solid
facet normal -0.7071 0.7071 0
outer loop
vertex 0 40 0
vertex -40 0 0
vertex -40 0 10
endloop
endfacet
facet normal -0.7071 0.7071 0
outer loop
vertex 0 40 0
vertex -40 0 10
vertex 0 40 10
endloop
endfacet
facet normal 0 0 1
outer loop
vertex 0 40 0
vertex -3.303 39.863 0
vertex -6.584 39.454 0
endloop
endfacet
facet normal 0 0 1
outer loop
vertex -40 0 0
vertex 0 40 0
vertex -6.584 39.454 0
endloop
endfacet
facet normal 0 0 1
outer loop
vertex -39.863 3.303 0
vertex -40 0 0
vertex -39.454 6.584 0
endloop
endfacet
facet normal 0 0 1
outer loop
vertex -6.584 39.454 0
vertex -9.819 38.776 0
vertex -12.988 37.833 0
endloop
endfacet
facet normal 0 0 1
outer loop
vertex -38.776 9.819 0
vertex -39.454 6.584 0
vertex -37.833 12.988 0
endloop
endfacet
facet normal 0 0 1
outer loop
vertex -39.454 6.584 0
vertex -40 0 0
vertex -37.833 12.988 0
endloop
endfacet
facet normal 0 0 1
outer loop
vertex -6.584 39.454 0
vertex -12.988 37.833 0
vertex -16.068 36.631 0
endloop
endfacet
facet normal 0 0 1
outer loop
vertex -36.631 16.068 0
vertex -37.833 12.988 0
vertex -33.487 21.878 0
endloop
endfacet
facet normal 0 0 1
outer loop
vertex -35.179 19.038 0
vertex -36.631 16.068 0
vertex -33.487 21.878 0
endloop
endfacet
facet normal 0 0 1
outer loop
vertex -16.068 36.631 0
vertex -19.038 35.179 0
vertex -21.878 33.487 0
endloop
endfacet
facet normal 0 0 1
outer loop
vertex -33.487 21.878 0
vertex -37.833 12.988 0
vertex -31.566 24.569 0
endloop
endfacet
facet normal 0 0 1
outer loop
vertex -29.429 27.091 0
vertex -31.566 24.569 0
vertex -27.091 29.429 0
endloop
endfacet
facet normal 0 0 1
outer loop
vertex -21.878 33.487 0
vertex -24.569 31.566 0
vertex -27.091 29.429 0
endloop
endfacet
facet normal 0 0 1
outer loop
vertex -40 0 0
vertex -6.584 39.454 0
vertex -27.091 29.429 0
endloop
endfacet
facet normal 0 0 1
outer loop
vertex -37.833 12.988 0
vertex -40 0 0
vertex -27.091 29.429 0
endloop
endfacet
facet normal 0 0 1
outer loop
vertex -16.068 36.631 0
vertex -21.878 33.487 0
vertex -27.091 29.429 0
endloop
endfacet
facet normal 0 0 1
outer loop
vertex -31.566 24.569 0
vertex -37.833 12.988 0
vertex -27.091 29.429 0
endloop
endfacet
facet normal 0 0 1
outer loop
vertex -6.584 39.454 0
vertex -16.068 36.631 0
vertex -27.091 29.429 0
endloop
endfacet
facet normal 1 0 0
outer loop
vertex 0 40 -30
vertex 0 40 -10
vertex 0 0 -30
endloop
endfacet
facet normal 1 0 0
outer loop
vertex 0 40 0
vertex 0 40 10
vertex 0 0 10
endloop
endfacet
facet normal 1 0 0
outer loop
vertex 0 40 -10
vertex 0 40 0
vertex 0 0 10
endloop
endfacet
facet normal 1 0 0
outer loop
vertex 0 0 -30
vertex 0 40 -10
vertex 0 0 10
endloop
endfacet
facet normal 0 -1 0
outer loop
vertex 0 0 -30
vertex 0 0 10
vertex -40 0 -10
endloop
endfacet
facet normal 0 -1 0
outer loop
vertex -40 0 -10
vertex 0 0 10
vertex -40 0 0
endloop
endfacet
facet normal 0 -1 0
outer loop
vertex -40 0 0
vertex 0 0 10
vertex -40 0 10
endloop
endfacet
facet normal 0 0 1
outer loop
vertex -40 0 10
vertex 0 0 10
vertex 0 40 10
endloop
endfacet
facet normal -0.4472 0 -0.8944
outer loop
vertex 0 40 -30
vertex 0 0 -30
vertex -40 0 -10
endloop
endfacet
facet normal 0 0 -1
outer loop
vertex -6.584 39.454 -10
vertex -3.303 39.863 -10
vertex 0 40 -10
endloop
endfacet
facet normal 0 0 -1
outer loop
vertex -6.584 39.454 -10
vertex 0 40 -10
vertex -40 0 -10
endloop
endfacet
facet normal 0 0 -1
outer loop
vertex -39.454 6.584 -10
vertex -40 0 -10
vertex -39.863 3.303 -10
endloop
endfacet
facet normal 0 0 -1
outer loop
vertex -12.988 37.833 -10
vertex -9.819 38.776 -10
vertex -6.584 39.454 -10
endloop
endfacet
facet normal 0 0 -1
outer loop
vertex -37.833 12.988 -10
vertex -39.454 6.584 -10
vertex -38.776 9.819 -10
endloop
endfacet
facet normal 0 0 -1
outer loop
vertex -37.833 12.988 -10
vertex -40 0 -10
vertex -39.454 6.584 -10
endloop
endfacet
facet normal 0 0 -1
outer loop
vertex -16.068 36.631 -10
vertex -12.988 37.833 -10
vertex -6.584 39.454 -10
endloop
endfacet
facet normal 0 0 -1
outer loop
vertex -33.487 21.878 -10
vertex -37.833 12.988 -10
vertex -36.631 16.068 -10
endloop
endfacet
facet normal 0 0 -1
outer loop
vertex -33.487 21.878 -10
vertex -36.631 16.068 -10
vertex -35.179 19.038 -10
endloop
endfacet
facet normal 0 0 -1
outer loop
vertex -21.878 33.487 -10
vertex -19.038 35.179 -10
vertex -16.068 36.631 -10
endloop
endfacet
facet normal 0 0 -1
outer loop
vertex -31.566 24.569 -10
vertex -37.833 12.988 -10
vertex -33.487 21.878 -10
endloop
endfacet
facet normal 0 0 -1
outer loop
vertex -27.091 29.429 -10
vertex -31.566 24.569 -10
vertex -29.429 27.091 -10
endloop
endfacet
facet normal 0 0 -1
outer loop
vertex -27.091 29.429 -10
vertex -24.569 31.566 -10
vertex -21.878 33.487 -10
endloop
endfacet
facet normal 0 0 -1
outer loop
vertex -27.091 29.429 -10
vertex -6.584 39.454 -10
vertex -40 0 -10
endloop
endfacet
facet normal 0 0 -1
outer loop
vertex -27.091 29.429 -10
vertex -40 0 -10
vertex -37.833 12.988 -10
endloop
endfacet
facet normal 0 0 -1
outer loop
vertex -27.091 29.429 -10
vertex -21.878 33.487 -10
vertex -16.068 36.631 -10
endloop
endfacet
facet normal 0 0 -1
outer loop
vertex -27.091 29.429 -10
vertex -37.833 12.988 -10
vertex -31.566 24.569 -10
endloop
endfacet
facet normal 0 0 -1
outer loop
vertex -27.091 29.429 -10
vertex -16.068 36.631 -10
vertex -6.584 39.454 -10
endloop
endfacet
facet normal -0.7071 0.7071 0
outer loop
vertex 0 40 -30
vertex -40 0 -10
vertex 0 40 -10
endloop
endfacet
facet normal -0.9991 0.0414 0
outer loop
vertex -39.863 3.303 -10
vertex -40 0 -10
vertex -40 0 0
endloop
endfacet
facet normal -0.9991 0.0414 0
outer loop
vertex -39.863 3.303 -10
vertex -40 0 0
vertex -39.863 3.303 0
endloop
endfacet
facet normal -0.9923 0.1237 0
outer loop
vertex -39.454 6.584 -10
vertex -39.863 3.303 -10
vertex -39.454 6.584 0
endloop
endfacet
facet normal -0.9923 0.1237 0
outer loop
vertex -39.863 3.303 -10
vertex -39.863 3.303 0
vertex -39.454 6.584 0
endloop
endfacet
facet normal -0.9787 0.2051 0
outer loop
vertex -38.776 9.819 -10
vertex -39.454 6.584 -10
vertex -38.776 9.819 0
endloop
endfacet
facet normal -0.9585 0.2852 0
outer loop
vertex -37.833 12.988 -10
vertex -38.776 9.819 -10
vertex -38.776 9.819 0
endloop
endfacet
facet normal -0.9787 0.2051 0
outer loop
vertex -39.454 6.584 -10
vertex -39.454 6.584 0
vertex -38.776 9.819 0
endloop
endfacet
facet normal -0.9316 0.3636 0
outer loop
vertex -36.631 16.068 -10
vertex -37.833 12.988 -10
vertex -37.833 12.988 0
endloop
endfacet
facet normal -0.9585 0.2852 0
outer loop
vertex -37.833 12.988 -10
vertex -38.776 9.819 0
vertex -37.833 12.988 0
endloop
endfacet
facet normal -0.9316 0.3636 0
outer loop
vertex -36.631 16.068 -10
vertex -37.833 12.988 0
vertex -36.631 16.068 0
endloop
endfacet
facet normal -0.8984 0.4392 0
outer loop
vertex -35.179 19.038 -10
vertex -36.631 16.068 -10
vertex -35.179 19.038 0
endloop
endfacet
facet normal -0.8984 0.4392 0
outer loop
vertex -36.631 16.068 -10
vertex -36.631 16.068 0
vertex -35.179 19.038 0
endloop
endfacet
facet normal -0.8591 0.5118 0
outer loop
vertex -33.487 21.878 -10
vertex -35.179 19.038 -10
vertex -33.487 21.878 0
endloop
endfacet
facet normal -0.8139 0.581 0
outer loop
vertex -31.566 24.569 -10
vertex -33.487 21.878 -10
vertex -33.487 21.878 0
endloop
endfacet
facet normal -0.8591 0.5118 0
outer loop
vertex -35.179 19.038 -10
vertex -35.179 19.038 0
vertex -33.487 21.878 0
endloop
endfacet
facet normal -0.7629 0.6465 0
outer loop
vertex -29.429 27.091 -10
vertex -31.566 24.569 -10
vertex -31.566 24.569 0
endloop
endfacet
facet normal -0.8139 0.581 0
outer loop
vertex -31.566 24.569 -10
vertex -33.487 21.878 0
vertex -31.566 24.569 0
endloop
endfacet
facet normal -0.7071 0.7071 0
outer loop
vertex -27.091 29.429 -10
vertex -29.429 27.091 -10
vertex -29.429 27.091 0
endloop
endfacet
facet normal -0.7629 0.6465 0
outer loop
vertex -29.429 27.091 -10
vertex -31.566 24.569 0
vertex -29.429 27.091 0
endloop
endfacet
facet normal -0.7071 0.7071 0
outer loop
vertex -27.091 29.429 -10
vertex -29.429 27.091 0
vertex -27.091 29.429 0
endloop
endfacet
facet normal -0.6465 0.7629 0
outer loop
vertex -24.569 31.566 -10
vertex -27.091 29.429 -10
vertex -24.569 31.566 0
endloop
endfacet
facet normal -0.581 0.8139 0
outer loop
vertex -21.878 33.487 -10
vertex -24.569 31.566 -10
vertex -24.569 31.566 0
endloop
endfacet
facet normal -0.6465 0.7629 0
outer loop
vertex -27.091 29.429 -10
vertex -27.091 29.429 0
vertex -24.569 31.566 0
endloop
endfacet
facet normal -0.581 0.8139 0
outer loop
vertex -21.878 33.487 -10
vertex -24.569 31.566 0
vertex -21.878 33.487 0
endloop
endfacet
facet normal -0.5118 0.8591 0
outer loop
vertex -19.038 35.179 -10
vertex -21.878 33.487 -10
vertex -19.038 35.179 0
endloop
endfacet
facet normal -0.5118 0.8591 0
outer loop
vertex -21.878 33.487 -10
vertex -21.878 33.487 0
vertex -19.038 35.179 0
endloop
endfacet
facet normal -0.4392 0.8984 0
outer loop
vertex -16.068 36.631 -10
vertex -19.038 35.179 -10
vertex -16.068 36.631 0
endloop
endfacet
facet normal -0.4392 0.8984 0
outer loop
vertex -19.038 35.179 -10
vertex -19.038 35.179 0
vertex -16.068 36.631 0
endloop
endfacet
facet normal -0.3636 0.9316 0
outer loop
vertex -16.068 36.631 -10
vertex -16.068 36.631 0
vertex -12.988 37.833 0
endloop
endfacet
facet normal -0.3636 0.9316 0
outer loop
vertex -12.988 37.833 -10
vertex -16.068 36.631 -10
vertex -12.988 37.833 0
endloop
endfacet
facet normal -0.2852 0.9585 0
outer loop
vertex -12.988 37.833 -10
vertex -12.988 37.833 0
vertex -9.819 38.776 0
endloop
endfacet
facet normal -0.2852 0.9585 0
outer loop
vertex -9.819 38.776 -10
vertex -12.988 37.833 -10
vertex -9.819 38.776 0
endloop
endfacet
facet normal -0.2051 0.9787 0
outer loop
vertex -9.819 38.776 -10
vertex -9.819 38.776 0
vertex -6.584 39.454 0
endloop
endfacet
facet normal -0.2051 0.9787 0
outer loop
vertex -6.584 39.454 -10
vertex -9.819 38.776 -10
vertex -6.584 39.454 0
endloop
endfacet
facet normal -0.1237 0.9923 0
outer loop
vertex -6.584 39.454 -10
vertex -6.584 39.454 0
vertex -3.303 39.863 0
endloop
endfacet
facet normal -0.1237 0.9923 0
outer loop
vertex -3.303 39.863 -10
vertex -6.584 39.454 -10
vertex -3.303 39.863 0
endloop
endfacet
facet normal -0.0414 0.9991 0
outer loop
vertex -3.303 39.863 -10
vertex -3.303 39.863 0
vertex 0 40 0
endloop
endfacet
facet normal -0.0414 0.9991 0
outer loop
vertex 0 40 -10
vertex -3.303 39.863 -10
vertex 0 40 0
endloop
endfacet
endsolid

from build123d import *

# Parameters (mm, degrees)
BOSS_EXTRUDE1_DEPTH = 10
BOSS_EXTRUDE2_DEPTH = 10
BOSS_EXTRUDE4_DEPTH = 20
CUT_EXTRUDE3_DEPTH  = 57


with BuildPart() as part:
    # Sketch1 → Boss-Extrude1 (new body)
    with BuildSketch(Plane.XY):
        Polygon((0, 0), (-40, 0), (0, 40), align=None)
    extrude(amount=BOSS_EXTRUDE1_DEPTH)

    # Sketch2 → Boss-Extrude2 (add)
    with BuildSketch(Plane(origin=(0, 0, 0), x_dir=(-1, 0, 0), z_dir=(0, 0, -1))):
        with BuildLine():
            Line((0, 40), (0, 0))
            Line((0, 0), (40, 0))
            ThreePointArc((40, 0), (28.284271247, 28.284271247), (0, 40))
        make_face()
    extrude(amount=BOSS_EXTRUDE2_DEPTH)

    # Sketch3 → Boss-Extrude4 (add)
    with BuildSketch(Plane(origin=(0, 0, -10), x_dir=(-1, 0, 0), z_dir=(0, 0, -1))):
        Polygon((0, 40), (0, 0), (40, 0), align=None)
    extrude(amount=BOSS_EXTRUDE4_DEPTH)

    # Sketch5 → Cut-Extrude3 (cut)
    with BuildSketch(Plane.XZ):
        Polygon((0, -30), (-40, -10), (-40, -30), align=None)
    extrude(amount=-CUT_EXTRUDE3_DEPTH, mode=Mode.SUBTRACT)


solid = part.part
